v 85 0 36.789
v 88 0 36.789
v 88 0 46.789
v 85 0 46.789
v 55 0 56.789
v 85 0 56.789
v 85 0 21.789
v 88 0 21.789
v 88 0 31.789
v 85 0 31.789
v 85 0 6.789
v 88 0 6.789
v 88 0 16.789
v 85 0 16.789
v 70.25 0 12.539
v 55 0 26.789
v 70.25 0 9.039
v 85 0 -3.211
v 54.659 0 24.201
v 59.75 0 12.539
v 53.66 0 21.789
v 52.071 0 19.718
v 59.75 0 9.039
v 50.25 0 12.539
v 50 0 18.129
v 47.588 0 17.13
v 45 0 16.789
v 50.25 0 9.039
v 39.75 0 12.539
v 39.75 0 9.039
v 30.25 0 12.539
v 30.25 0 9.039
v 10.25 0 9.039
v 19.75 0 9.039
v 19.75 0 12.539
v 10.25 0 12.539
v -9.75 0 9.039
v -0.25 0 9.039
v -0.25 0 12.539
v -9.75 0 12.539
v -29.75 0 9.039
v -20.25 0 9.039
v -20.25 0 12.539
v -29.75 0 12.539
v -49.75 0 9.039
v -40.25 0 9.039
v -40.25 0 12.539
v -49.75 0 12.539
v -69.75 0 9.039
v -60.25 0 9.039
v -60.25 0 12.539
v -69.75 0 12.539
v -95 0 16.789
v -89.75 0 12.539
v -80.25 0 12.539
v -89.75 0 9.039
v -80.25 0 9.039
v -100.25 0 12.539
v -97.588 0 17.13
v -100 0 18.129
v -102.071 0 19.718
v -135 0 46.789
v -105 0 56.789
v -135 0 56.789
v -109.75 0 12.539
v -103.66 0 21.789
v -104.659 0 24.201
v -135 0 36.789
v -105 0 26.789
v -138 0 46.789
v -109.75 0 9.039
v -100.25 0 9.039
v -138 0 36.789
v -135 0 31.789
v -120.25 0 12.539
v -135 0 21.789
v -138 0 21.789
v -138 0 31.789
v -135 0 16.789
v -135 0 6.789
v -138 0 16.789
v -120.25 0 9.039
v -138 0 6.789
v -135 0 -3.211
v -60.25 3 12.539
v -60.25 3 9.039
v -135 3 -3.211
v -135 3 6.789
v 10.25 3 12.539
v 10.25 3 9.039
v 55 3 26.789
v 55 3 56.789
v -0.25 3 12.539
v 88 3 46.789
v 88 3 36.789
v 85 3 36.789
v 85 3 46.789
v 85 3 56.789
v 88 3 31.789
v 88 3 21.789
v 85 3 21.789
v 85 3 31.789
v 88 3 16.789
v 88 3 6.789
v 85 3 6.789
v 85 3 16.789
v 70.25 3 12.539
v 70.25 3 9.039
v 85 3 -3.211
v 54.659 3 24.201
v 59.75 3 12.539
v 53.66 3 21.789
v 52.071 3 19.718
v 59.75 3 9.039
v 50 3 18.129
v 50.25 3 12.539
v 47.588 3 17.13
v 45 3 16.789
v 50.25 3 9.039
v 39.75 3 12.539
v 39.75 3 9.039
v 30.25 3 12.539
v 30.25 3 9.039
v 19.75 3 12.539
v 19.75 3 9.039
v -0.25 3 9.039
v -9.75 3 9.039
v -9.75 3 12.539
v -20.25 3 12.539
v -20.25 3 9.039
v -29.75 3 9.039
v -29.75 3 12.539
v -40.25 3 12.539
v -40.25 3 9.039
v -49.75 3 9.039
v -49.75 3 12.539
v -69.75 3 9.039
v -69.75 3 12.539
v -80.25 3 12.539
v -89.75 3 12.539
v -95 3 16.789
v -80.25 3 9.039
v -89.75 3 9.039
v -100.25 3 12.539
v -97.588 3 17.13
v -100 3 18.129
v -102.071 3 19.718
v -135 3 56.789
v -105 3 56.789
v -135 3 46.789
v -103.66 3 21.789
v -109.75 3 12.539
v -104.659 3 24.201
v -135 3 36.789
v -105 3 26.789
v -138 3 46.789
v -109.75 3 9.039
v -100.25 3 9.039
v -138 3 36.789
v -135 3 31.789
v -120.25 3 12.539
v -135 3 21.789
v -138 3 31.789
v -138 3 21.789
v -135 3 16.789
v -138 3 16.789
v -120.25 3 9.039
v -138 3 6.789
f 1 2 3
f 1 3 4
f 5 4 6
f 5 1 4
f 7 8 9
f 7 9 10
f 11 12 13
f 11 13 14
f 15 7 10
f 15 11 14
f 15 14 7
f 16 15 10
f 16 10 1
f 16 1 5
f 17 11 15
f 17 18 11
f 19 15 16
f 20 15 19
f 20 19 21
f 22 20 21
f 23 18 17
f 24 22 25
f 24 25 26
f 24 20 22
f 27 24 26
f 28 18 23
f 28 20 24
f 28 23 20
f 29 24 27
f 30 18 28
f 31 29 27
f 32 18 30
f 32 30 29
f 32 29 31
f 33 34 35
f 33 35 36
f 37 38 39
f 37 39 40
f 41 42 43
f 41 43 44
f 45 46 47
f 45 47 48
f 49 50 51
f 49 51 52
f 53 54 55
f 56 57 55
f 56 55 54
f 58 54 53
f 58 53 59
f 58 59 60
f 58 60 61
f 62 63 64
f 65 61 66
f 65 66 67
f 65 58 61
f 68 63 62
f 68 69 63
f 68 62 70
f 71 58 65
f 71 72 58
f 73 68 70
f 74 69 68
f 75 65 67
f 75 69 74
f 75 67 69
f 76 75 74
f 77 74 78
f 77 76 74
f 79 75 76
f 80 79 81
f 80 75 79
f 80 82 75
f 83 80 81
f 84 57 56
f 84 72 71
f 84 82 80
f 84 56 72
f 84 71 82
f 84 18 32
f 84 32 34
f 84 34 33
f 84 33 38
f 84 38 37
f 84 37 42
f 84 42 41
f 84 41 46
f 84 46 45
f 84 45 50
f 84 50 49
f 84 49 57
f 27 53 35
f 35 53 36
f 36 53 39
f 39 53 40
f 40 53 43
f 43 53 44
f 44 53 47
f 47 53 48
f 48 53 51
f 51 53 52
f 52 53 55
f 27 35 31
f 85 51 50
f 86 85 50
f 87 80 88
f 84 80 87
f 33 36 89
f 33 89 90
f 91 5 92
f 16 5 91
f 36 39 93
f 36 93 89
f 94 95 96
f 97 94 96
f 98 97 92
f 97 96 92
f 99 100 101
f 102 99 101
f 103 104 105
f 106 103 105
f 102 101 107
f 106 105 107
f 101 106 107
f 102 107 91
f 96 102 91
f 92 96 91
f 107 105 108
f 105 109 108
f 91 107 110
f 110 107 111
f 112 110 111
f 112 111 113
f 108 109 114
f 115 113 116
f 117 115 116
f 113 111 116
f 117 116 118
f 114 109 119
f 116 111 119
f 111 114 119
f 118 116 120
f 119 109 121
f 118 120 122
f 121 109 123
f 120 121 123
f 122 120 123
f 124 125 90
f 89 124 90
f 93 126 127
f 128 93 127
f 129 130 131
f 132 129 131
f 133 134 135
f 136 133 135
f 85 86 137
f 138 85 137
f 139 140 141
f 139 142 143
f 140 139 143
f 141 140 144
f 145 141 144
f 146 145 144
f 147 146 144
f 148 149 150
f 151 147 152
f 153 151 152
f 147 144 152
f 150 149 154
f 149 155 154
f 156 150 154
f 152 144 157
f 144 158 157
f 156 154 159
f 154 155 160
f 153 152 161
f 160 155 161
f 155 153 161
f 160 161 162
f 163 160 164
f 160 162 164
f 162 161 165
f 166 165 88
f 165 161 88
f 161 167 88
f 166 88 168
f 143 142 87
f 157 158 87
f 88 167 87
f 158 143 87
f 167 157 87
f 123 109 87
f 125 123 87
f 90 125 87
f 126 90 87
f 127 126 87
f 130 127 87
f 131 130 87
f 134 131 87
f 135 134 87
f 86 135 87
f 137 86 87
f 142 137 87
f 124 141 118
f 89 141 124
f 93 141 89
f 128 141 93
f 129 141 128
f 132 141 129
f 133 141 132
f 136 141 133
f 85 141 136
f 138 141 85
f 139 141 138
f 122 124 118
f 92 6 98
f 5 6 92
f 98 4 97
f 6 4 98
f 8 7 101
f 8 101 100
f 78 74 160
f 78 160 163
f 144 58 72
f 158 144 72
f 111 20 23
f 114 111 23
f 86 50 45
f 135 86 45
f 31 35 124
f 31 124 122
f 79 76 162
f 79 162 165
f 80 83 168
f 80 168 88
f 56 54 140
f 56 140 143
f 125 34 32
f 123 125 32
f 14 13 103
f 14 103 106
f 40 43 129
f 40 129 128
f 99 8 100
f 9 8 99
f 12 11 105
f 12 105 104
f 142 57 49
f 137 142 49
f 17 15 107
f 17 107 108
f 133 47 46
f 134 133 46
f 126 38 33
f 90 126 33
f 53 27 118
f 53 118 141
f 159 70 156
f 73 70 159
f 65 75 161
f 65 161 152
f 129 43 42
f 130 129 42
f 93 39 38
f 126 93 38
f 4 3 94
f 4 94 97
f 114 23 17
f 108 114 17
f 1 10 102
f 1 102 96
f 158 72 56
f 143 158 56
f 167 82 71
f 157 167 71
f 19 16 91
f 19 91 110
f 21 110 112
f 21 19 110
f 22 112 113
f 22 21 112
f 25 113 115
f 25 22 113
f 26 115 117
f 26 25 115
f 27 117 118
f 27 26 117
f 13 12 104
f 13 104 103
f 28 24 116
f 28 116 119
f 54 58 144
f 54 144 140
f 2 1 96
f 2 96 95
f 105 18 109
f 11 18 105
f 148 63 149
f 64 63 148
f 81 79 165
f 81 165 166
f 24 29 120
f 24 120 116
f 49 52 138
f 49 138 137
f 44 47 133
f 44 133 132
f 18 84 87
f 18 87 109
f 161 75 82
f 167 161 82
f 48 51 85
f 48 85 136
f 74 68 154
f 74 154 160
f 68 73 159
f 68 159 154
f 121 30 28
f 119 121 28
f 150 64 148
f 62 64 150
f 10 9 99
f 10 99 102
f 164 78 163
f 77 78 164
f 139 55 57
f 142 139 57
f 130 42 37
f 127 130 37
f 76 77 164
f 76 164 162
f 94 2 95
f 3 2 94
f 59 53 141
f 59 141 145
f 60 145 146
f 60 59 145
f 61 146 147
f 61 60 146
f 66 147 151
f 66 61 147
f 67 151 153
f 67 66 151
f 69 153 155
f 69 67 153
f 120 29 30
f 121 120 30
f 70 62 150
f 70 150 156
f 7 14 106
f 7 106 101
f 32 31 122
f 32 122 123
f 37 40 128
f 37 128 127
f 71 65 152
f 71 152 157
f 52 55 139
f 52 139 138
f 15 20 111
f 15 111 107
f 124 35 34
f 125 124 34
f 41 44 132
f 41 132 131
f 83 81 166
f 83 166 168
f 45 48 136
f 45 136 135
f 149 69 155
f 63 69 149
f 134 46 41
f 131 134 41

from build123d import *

# Parameters (mm, degrees)
EXTRUDE_1_DEPTH     = 3
SKETCH_2_W          = 10.5
SKETCH_2_H          = 3.5
CUT_EXTRUDE_1_DEPTH = 150.258104234


with BuildPart() as part:
    # Эскиз1 → Бобышка-Вытянуть1 (new body)
    with BuildSketch(Plane(origin=(0, 0, 0), x_dir=(1, 0, 0), z_dir=(0, 1, 0))):
        with BuildLine():
            Line((-135, -31.788922156), (-138, -31.788922156))
            Line((-138, -31.788922156), (-138, -21.788922156))
            Line((-138, -21.788922156), (-135, -21.788922156))
            Line((-135, -21.788922156), (-135, -16.788922156))
            Line((-135, -16.788922156), (-138, -16.788922156))
            Line((-138, -16.788922156), (-138, -6.788922156))
            Line((-138, -6.788922156), (-135, -6.788922156))
            Line((-135, -6.788922156), (-135, 3.211077844))
            Line((-135, 3.211077844), (-125, 3.211077844))
            Line((-125, 3.211077844), (75, 3.211077844))
            Line((75, 3.211077844), (85, 3.211077844))
            Line((85, 3.211077844), (85, -6.788922156))
            Line((85, -6.788922156), (88, -6.788922156))
            Line((88, -6.788922156), (88, -16.788922156))
            Line((88, -16.788922156), (85, -16.788922156))
            Line((85, -16.788922156), (85, -21.788922156))
            Line((85, -21.788922156), (88, -21.788922156))
            Line((88, -21.788922156), (88, -31.788922156))
            Line((88, -31.788922156), (85, -31.788922156))
            Line((85, -31.788922156), (85, -36.788922156))
            Line((85, -36.788922156), (88, -36.788922156))
            Line((88, -36.788922156), (88, -46.788922156))
            Line((88, -46.788922156), (85, -46.788922156))
            Line((85, -46.788922156), (85, -56.788922156))
            Line((85, -56.788922156), (55, -56.788922156))
            Line((55, -56.788922156), (55, -26.788922156))
            ThreePointArc((55, -26.788922156), (52.071067812, -19.717854344), (45, -16.788922156))
            Line((45, -16.788922156), (-95, -16.788922156))
            ThreePointArc((-95, -16.788922156), (-102.071067812, -19.717854344), (-105, -26.788922156))
            Line((-105, -26.788922156), (-105, -56.788922156))
            Line((-105, -56.788922156), (-135, -56.788922156))
            Line((-135, -56.788922156), (-135, -46.788922156))
            Line((-135, -46.788922156), (-138, -46.788922156))
            Line((-138, -46.788922156), (-138, -36.788922156))
            Line((-138, -36.788922156), (-135, -36.788922156))
            Line((-135, -36.788922156), (-135, -31.788922156))
        make_face()
    extrude(amount=EXTRUDE_1_DEPTH)

    # Эскиз2 → Вырез-Вытянуть1 (cut, through all)
    with BuildSketch(Plane(origin=(0, 0, 0), x_dir=(1, 0, 0), z_dir=(0, 1, 0))):
        with Locations((-115, -10.788922156)):
            Rectangle(SKETCH_2_W, SKETCH_2_H)
        with Locations((-95, -10.788922156)):
            Rectangle(SKETCH_2_W, SKETCH_2_H)
        with Locations((-75, -10.788922156)):
            Rectangle(SKETCH_2_W, SKETCH_2_H)
        with Locations((-55, -10.788922156)):
            Rectangle(SKETCH_2_W, SKETCH_2_H)
        with Locations((-35, -10.788922156)):
            Rectangle(SKETCH_2_W, SKETCH_2_H)
        with Locations((-15, -10.788922156)):
            Rectangle(SKETCH_2_W, SKETCH_2_H)
        with Locations((5, -10.788922156)):
            Rectangle(SKETCH_2_W, SKETCH_2_H)
        with Locations((25, -10.788922156)):
            Rectangle(SKETCH_2_W, SKETCH_2_H)
        with Locations((45, -10.788922156)):
            Rectangle(SKETCH_2_W, SKETCH_2_H)
        with Locations((65, -10.788922156)):
            Rectangle(SKETCH_2_W, SKETCH_2_H)
    extrude(amount=CUT_EXTRUDE_1_DEPTH, mode=Mode.SUBTRACT)


solid = part.part
